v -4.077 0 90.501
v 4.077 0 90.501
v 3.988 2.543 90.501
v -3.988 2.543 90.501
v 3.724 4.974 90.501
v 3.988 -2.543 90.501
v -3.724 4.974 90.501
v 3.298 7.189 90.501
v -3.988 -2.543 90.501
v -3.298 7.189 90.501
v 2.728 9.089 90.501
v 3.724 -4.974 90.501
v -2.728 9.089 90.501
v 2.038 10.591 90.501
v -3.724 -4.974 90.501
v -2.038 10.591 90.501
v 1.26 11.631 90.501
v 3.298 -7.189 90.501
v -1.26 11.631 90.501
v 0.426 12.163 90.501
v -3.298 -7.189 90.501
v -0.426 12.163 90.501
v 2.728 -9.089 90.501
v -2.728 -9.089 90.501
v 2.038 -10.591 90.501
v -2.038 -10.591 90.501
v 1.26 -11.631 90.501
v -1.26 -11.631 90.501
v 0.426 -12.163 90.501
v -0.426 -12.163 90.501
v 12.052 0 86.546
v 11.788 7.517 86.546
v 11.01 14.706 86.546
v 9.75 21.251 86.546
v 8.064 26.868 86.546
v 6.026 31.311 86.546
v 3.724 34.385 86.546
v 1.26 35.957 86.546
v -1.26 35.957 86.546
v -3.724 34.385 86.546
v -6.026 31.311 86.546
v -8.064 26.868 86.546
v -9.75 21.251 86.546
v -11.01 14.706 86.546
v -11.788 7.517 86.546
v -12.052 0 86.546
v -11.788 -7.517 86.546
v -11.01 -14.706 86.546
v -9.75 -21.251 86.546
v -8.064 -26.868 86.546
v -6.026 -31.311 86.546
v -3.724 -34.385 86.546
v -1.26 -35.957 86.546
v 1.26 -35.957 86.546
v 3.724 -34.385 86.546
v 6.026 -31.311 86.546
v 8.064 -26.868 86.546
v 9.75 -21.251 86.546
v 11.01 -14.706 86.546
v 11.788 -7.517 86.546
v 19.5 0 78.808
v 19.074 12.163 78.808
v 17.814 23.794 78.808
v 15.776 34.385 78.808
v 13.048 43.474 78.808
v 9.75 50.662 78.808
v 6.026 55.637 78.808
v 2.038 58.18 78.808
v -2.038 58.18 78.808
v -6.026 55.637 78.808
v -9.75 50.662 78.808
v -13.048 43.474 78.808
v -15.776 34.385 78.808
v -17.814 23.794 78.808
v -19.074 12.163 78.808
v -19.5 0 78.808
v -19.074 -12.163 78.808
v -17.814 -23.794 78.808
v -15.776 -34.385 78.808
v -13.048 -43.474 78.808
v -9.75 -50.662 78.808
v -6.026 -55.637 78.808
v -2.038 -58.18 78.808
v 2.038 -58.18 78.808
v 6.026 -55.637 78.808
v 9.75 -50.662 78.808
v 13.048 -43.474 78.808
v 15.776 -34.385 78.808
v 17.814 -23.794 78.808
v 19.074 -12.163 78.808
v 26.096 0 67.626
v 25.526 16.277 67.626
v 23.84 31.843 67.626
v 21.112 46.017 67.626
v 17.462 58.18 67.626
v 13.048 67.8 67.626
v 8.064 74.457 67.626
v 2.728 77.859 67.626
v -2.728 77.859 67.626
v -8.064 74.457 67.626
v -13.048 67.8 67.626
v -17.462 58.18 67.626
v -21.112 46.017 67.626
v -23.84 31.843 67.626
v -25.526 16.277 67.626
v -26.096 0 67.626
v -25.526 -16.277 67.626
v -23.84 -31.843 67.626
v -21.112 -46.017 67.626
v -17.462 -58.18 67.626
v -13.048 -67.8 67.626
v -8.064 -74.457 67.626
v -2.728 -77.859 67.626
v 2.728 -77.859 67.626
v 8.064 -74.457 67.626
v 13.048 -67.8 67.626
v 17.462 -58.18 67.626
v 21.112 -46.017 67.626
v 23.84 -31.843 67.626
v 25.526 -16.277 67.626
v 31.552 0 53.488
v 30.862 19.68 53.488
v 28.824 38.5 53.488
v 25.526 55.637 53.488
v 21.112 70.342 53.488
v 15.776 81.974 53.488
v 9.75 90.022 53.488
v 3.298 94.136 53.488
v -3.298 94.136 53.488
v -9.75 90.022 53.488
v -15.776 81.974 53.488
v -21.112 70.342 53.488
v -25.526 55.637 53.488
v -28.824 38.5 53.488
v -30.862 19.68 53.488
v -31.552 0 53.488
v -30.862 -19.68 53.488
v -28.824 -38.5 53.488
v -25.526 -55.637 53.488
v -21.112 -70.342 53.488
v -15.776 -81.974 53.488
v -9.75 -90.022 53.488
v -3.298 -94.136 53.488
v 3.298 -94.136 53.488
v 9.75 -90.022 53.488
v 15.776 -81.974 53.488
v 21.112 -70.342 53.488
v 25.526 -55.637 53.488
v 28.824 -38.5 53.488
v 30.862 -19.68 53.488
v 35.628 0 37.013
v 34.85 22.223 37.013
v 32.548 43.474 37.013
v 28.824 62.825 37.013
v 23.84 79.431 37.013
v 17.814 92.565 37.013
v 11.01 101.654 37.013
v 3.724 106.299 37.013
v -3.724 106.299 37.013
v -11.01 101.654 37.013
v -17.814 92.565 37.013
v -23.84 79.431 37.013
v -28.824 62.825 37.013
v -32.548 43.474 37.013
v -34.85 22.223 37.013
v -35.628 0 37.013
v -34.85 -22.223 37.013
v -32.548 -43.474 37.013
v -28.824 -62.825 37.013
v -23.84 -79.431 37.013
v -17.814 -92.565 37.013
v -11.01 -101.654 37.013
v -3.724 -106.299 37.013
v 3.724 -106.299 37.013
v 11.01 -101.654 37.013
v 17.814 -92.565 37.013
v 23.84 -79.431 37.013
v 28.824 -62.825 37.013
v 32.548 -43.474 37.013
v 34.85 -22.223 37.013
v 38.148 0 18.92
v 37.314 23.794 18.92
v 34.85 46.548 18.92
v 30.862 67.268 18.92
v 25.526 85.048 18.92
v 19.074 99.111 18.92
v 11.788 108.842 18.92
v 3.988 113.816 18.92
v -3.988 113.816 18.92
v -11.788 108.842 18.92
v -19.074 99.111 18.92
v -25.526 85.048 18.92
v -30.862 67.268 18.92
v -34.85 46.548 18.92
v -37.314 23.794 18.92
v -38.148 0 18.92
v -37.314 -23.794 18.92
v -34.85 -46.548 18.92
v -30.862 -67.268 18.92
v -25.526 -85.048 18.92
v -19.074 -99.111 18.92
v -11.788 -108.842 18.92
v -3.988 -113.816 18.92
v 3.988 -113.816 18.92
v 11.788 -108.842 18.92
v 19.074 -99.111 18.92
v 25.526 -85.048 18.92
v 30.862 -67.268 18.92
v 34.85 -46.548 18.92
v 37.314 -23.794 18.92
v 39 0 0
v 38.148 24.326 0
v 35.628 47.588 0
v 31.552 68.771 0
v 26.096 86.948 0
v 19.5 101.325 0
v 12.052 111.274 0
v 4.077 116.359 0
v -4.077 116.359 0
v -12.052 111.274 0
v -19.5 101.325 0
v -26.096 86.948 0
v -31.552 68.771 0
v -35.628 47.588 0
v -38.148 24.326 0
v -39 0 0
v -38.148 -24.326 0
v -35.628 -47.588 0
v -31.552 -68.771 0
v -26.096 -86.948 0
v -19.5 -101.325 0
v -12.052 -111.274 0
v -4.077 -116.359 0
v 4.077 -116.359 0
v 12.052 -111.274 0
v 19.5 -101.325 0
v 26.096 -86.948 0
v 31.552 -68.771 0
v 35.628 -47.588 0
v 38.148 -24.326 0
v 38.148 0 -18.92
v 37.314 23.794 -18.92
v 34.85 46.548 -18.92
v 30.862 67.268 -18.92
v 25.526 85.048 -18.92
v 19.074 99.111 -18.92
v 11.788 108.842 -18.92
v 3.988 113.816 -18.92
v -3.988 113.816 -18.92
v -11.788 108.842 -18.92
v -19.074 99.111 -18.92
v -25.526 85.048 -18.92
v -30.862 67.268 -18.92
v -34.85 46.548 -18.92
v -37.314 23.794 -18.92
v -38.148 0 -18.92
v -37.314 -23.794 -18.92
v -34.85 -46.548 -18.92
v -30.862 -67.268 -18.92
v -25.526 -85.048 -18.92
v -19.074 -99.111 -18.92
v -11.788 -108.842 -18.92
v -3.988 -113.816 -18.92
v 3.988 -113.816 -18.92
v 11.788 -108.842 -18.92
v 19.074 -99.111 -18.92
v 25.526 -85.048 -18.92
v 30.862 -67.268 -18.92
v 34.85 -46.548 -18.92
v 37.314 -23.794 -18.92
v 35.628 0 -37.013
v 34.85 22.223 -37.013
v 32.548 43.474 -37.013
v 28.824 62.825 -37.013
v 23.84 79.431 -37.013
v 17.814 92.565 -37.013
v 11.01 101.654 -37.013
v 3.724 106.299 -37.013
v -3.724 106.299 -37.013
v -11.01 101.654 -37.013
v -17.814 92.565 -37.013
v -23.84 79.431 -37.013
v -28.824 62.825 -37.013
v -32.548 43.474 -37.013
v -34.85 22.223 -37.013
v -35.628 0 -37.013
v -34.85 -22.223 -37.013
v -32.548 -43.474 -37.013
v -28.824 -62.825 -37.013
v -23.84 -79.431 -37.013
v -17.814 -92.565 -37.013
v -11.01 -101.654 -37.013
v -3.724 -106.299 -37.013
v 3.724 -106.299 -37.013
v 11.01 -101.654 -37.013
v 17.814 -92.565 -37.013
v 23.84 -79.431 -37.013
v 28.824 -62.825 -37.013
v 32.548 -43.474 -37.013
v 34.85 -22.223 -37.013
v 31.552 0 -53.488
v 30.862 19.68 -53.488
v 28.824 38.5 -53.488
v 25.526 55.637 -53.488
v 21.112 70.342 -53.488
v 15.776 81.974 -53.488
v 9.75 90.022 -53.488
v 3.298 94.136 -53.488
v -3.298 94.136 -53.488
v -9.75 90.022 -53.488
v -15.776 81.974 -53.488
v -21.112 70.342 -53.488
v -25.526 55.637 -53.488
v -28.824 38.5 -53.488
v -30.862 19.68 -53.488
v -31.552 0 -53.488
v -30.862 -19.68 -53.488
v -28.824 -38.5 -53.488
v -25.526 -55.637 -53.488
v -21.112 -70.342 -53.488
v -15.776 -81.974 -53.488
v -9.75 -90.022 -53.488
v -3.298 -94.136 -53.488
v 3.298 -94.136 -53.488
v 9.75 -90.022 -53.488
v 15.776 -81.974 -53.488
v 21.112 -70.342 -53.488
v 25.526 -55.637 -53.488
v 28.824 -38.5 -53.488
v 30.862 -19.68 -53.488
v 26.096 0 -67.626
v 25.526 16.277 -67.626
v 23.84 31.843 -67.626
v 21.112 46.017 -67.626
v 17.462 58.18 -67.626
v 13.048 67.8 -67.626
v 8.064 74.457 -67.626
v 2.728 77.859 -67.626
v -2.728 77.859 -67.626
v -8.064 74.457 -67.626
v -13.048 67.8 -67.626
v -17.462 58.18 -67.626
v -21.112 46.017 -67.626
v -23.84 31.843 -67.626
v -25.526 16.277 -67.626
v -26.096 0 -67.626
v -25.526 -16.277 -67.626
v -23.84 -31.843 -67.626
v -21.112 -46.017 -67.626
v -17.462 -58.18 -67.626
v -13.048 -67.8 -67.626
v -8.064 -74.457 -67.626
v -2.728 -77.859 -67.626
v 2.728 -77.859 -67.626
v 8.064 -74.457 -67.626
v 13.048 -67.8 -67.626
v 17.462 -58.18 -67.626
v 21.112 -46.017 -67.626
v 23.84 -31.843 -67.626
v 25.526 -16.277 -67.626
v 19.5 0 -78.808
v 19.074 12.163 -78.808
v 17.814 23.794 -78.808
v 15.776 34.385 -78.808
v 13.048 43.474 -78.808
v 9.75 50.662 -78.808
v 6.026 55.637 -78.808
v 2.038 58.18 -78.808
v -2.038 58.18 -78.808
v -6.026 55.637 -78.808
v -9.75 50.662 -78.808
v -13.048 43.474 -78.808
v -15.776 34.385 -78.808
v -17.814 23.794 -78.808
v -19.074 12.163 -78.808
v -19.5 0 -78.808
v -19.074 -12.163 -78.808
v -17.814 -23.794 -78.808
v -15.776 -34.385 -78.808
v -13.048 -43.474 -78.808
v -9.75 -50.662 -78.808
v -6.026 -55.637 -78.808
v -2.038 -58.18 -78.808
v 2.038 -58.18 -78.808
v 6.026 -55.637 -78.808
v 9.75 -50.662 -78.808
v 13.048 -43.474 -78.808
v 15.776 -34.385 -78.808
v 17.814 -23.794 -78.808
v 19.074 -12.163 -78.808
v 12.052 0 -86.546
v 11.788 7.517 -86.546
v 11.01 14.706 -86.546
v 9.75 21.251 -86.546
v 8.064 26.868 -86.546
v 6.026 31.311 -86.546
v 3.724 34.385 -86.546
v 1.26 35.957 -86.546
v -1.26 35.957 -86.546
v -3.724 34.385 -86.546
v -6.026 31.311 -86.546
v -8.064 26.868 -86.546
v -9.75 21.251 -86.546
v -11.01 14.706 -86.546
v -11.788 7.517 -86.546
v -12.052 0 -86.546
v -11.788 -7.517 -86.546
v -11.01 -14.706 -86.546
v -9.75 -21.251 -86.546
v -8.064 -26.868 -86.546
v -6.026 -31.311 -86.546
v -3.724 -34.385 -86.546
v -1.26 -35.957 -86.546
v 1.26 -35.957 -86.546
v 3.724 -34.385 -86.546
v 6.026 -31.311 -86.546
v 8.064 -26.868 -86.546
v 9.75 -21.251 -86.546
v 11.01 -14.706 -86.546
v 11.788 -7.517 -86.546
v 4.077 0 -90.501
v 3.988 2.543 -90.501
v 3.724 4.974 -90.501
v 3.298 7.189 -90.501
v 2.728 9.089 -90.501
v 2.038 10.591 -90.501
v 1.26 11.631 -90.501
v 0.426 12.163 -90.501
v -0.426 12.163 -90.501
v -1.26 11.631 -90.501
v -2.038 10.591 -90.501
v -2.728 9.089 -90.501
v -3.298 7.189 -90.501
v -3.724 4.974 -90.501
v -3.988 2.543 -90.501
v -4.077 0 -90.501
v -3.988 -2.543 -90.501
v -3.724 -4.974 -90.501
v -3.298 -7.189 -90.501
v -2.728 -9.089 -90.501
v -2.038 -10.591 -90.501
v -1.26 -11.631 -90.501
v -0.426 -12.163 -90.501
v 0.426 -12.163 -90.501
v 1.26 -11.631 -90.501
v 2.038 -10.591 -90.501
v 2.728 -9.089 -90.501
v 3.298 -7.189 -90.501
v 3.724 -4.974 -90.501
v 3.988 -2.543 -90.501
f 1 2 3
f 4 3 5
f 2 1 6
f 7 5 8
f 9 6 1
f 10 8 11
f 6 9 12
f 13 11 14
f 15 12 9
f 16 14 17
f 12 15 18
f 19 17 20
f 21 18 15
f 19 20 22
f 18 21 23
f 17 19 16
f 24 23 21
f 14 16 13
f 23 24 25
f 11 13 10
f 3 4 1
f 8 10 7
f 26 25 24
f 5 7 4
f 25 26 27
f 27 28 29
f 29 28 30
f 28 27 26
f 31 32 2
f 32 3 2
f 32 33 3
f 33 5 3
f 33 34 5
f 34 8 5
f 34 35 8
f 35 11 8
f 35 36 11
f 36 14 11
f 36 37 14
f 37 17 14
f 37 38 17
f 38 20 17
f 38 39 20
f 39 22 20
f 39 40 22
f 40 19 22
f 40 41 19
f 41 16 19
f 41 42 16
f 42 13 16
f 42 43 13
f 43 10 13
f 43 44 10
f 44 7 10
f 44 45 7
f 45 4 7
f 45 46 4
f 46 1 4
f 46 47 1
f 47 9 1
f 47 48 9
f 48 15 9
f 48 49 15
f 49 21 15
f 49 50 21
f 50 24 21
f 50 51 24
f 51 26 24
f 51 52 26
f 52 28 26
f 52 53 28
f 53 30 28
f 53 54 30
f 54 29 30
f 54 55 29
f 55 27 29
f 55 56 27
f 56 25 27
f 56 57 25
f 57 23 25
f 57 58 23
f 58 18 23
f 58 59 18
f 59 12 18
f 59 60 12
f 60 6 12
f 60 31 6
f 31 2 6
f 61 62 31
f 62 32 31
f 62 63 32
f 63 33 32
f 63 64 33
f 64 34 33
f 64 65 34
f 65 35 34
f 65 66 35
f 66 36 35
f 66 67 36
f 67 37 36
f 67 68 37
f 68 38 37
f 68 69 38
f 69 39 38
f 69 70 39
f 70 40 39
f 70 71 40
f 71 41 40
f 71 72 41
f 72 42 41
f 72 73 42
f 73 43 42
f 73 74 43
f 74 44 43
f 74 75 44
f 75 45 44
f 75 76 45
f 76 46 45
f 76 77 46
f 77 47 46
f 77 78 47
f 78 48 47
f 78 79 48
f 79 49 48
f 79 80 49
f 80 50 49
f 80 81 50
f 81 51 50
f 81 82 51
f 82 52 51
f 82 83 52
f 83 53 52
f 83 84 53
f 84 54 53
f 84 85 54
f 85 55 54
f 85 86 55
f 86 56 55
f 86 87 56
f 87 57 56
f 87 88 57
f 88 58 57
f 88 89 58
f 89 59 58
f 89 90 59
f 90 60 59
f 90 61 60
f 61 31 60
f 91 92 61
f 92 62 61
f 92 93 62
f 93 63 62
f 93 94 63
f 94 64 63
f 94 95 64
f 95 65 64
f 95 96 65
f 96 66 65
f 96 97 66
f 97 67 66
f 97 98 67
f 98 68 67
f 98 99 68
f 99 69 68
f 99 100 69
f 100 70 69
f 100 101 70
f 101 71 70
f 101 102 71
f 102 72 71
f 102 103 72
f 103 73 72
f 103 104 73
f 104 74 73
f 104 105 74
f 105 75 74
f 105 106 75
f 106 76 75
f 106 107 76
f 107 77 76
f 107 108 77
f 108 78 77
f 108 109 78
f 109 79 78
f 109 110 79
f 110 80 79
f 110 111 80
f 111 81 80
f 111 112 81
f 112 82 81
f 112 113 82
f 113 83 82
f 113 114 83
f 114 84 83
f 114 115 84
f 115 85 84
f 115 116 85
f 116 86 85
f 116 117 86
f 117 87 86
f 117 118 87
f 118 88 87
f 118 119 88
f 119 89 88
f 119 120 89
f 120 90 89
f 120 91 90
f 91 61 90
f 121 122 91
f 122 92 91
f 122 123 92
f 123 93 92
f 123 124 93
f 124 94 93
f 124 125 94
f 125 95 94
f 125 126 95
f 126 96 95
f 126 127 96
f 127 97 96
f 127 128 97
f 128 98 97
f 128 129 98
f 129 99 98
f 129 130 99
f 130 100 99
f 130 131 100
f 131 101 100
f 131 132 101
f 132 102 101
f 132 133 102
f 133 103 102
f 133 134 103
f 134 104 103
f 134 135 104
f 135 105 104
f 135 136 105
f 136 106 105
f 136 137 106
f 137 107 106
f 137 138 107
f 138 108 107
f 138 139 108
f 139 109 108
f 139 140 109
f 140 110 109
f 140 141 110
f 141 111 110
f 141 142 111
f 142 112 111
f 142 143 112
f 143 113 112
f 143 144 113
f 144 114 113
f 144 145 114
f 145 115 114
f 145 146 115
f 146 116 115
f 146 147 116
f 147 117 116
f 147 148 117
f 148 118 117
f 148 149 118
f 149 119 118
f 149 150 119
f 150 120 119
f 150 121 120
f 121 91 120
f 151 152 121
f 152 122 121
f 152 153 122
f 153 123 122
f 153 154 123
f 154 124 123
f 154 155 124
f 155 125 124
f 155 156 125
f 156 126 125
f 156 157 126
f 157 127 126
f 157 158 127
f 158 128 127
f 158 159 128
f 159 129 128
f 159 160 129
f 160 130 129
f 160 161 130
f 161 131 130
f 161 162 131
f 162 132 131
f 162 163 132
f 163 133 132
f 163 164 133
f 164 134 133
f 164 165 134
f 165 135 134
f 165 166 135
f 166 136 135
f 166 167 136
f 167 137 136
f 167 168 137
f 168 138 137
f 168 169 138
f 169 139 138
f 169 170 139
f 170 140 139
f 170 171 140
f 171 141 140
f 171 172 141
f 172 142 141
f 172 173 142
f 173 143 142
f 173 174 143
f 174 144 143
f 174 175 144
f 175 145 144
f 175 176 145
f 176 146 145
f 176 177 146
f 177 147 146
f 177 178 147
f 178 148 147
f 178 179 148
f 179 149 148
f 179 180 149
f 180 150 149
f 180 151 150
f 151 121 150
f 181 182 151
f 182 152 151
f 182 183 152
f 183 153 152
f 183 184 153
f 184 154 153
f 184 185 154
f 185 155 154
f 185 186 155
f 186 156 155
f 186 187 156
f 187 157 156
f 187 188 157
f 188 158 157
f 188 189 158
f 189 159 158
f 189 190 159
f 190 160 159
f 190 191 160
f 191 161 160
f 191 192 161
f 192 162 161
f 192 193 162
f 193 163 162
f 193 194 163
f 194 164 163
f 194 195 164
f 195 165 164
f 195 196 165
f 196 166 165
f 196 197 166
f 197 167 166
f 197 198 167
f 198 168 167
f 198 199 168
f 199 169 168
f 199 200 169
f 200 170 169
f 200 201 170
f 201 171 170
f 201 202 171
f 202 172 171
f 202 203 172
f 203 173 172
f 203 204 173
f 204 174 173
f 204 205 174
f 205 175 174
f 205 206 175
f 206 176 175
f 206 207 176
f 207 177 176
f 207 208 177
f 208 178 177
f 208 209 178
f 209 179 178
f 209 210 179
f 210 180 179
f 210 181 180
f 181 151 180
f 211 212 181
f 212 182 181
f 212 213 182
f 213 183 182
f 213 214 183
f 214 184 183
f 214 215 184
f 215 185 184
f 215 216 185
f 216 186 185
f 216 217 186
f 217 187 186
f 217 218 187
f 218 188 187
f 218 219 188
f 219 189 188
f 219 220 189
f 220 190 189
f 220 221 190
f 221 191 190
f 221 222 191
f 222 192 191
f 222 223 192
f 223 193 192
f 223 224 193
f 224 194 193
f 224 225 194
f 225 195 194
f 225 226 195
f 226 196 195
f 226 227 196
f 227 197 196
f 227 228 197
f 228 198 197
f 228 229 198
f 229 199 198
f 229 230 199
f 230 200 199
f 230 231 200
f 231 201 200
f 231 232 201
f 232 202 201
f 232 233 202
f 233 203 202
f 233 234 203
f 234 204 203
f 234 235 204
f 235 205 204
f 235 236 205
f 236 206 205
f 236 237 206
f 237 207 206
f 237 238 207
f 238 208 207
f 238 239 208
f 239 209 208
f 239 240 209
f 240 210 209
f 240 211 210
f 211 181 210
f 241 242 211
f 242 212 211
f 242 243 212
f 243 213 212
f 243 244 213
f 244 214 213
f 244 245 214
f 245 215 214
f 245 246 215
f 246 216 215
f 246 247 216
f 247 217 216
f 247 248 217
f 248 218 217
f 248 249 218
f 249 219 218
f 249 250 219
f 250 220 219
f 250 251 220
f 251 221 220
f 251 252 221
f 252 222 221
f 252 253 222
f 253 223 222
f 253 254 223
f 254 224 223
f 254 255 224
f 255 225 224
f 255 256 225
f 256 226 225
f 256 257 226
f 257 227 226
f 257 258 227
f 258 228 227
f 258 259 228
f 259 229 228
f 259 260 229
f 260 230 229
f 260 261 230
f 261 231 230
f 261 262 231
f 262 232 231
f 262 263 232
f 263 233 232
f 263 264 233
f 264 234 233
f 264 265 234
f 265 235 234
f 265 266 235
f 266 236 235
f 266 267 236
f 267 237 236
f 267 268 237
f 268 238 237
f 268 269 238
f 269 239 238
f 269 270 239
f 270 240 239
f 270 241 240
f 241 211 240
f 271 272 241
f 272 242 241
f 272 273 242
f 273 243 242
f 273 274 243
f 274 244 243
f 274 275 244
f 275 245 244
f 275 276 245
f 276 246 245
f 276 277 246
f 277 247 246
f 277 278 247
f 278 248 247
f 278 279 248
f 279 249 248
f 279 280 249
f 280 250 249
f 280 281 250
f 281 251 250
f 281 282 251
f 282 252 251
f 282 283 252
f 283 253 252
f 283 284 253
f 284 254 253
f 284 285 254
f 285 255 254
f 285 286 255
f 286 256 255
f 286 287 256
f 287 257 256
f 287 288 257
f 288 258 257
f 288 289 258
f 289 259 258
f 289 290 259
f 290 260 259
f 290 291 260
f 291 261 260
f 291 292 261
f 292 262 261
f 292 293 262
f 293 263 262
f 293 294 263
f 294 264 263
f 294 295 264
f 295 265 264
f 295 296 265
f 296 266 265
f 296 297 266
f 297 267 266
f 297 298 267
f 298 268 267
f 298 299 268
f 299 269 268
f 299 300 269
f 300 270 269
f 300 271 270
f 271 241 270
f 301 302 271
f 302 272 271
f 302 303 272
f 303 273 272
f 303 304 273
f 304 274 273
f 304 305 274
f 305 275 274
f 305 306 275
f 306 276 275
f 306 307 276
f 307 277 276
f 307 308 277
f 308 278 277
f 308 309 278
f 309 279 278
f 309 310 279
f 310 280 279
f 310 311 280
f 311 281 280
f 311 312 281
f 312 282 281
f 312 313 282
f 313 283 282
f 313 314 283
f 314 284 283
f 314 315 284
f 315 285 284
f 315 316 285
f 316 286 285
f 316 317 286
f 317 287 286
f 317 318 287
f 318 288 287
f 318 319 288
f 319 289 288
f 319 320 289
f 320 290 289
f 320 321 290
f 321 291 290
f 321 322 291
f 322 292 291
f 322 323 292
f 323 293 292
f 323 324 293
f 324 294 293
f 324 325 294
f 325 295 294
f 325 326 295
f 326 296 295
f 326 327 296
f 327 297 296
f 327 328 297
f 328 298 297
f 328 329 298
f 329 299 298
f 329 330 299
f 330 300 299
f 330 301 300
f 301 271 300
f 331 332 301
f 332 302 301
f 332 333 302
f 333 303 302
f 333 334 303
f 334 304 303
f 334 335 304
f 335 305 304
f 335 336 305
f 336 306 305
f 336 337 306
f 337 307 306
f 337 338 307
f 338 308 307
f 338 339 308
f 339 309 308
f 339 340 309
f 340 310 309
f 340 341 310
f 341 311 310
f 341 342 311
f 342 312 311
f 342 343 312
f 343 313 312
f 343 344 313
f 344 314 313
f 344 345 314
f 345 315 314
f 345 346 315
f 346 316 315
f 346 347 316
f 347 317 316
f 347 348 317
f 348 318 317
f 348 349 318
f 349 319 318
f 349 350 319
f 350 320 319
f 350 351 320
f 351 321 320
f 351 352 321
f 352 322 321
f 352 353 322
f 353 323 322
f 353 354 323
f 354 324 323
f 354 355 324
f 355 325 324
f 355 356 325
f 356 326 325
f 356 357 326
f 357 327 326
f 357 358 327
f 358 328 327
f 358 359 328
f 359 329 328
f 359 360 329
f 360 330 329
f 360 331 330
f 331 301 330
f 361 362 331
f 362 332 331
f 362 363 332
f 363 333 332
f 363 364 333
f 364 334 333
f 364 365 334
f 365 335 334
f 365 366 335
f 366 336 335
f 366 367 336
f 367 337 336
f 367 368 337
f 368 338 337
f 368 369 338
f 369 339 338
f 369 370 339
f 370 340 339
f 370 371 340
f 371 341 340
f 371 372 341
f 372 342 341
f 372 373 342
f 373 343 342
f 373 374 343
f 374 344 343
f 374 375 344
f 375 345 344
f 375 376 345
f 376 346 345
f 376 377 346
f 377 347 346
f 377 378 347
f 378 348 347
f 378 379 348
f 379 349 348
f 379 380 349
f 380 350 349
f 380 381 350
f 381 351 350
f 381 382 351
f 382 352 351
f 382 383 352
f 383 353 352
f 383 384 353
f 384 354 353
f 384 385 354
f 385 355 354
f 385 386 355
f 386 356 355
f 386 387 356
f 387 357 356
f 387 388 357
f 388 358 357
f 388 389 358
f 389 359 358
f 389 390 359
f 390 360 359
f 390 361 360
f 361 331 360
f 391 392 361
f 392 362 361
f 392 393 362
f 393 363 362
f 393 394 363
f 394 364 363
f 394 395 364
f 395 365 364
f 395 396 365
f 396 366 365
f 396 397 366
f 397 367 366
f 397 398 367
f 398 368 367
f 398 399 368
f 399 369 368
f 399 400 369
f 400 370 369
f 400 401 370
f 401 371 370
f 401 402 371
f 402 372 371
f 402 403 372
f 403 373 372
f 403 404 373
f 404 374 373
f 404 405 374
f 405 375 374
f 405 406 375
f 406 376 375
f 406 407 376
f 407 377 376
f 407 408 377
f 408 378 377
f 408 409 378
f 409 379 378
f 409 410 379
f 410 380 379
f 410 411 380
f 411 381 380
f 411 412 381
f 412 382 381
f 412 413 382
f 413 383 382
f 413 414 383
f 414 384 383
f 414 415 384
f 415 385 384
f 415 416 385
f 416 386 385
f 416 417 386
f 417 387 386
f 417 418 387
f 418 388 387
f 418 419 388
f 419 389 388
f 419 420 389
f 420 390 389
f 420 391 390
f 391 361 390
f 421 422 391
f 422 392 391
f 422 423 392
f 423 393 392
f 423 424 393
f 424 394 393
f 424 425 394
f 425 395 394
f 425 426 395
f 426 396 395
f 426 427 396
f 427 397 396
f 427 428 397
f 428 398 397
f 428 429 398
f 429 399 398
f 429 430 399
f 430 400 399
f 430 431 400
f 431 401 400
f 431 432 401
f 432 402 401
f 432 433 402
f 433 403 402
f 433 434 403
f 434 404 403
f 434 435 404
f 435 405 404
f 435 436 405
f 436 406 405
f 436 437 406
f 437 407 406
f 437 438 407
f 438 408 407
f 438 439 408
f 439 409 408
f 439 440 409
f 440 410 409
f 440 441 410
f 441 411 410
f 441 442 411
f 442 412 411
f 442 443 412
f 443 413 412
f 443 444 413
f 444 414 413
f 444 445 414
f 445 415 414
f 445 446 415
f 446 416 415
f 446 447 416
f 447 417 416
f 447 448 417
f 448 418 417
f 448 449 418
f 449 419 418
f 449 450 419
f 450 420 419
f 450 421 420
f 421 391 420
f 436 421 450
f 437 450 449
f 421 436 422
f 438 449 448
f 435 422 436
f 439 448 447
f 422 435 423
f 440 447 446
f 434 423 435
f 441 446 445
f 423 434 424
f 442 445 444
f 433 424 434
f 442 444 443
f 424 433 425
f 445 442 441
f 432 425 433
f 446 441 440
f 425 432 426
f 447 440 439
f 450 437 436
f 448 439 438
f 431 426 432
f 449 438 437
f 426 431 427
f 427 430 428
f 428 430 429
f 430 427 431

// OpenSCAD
// Generated by SolidPython 1.0.1 on 2020-07-29 00:46:45


scale(v = [3, 9, 7]) {
	sphere(r = 13);
}
/***********************************************
*********      SolidPython code:      **********
************************************************
 
# import packages: SolidPython
from solid import *
from solid.utils import *
from itertools import chain, combinations, permutations


class Resize:

    def __init__(self, scad_file):
        self.scad_file = scad_file
        #self.scad_file = import_scad(scad_file)
        # cone/cylinder param:
        self.r1 = 0
        self.r2 = 0
        self.h = 0
        # rectangular prism param:
        self.w = 0
        self.l = 0
        # ellipse param:
        self.r = 0

    # import OpenScad code (file name corresponds to shape)


    # classify shape + parameters
    def assign(self, param1, param2, param3):
        if self.scad_file == 'cone.scad':
            self.r1 = param1
            self.r2 = param2
            self.h = param3
        elif self.scad_file == 'cylinder.scad':
            self.r1 = param1
            self.r2 = param2
            self.h = param3
        elif self.scad_file == 'rectangularPrism.scad':
            self.h = param1
            self.l = param2
            self.w = param3
        else:
            self.r = param1
            self.h = param2

    # resize parameters
    def iterate(self):
        x = range(3, 20, 2)
        i = 1
        if self.scad_file == 'cone.scad':
            tempList = list(permutations(x, 2))
            for temp in tempList:
                param1 = temp[0]
                param2 = temp[1]
                filepath = 'produced_scad_files/' + 'cone' + str(param1) + '_' + str(param2) + '_' + '.scad'
                scad_render_to_file(cylinder(h=param1, r1=param2, r2=0), filepath)

        elif self.scad_file == 'cylinder.scad':
            tempList = list(permutations(x, 3))
            for temp in tempList:
                param1 = temp[0]
                param2 = temp[1]
                filepath = 'produced_scad_files/' + 'cylinder' + str(param1) + '_' + str(param2) + '_' + '.scad'
                scad_render_to_file(cylinder(h=param1, r1=param2, r2=param2), filepath)

        elif self.scad_file == 'rectangularPrism.scad':
            tempList = list(permutations(x, 3))
            for temp in tempList:
                param1 = temp[0]
                param2 = temp[1]
                param3 = temp[2]
                filepath = 'produced_scad_files/' + 'rectangularPrism' + str(param1) + '_' + str(param2) + '_' + str(
                    param3) + '.scad'
                scad_render_to_file(cube(size=(param1, param2, param3)), filepath)

        elif self.scad_file == 'ellipse.scad':
            tempList = list(permutations(x, 4))
            for temp in tempList:
                param1 = temp[0]
                param2 = temp[1]
                param3 = temp[2]
                param4 = temp[3]
                filepath = 'produced_scad_files/' + 'ellipse' + str(param1) + '_' + str(param2) + '_' + str(param3) + '_' + str(param4) + '.scad'
                scad_render_to_file(scale([param1, param2, param3])(sphere(r=param4)), filepath)

    def render_to_scadfile(self):
        scad_render_to_file(scad, 'example.scad') 
 
************************************************/
